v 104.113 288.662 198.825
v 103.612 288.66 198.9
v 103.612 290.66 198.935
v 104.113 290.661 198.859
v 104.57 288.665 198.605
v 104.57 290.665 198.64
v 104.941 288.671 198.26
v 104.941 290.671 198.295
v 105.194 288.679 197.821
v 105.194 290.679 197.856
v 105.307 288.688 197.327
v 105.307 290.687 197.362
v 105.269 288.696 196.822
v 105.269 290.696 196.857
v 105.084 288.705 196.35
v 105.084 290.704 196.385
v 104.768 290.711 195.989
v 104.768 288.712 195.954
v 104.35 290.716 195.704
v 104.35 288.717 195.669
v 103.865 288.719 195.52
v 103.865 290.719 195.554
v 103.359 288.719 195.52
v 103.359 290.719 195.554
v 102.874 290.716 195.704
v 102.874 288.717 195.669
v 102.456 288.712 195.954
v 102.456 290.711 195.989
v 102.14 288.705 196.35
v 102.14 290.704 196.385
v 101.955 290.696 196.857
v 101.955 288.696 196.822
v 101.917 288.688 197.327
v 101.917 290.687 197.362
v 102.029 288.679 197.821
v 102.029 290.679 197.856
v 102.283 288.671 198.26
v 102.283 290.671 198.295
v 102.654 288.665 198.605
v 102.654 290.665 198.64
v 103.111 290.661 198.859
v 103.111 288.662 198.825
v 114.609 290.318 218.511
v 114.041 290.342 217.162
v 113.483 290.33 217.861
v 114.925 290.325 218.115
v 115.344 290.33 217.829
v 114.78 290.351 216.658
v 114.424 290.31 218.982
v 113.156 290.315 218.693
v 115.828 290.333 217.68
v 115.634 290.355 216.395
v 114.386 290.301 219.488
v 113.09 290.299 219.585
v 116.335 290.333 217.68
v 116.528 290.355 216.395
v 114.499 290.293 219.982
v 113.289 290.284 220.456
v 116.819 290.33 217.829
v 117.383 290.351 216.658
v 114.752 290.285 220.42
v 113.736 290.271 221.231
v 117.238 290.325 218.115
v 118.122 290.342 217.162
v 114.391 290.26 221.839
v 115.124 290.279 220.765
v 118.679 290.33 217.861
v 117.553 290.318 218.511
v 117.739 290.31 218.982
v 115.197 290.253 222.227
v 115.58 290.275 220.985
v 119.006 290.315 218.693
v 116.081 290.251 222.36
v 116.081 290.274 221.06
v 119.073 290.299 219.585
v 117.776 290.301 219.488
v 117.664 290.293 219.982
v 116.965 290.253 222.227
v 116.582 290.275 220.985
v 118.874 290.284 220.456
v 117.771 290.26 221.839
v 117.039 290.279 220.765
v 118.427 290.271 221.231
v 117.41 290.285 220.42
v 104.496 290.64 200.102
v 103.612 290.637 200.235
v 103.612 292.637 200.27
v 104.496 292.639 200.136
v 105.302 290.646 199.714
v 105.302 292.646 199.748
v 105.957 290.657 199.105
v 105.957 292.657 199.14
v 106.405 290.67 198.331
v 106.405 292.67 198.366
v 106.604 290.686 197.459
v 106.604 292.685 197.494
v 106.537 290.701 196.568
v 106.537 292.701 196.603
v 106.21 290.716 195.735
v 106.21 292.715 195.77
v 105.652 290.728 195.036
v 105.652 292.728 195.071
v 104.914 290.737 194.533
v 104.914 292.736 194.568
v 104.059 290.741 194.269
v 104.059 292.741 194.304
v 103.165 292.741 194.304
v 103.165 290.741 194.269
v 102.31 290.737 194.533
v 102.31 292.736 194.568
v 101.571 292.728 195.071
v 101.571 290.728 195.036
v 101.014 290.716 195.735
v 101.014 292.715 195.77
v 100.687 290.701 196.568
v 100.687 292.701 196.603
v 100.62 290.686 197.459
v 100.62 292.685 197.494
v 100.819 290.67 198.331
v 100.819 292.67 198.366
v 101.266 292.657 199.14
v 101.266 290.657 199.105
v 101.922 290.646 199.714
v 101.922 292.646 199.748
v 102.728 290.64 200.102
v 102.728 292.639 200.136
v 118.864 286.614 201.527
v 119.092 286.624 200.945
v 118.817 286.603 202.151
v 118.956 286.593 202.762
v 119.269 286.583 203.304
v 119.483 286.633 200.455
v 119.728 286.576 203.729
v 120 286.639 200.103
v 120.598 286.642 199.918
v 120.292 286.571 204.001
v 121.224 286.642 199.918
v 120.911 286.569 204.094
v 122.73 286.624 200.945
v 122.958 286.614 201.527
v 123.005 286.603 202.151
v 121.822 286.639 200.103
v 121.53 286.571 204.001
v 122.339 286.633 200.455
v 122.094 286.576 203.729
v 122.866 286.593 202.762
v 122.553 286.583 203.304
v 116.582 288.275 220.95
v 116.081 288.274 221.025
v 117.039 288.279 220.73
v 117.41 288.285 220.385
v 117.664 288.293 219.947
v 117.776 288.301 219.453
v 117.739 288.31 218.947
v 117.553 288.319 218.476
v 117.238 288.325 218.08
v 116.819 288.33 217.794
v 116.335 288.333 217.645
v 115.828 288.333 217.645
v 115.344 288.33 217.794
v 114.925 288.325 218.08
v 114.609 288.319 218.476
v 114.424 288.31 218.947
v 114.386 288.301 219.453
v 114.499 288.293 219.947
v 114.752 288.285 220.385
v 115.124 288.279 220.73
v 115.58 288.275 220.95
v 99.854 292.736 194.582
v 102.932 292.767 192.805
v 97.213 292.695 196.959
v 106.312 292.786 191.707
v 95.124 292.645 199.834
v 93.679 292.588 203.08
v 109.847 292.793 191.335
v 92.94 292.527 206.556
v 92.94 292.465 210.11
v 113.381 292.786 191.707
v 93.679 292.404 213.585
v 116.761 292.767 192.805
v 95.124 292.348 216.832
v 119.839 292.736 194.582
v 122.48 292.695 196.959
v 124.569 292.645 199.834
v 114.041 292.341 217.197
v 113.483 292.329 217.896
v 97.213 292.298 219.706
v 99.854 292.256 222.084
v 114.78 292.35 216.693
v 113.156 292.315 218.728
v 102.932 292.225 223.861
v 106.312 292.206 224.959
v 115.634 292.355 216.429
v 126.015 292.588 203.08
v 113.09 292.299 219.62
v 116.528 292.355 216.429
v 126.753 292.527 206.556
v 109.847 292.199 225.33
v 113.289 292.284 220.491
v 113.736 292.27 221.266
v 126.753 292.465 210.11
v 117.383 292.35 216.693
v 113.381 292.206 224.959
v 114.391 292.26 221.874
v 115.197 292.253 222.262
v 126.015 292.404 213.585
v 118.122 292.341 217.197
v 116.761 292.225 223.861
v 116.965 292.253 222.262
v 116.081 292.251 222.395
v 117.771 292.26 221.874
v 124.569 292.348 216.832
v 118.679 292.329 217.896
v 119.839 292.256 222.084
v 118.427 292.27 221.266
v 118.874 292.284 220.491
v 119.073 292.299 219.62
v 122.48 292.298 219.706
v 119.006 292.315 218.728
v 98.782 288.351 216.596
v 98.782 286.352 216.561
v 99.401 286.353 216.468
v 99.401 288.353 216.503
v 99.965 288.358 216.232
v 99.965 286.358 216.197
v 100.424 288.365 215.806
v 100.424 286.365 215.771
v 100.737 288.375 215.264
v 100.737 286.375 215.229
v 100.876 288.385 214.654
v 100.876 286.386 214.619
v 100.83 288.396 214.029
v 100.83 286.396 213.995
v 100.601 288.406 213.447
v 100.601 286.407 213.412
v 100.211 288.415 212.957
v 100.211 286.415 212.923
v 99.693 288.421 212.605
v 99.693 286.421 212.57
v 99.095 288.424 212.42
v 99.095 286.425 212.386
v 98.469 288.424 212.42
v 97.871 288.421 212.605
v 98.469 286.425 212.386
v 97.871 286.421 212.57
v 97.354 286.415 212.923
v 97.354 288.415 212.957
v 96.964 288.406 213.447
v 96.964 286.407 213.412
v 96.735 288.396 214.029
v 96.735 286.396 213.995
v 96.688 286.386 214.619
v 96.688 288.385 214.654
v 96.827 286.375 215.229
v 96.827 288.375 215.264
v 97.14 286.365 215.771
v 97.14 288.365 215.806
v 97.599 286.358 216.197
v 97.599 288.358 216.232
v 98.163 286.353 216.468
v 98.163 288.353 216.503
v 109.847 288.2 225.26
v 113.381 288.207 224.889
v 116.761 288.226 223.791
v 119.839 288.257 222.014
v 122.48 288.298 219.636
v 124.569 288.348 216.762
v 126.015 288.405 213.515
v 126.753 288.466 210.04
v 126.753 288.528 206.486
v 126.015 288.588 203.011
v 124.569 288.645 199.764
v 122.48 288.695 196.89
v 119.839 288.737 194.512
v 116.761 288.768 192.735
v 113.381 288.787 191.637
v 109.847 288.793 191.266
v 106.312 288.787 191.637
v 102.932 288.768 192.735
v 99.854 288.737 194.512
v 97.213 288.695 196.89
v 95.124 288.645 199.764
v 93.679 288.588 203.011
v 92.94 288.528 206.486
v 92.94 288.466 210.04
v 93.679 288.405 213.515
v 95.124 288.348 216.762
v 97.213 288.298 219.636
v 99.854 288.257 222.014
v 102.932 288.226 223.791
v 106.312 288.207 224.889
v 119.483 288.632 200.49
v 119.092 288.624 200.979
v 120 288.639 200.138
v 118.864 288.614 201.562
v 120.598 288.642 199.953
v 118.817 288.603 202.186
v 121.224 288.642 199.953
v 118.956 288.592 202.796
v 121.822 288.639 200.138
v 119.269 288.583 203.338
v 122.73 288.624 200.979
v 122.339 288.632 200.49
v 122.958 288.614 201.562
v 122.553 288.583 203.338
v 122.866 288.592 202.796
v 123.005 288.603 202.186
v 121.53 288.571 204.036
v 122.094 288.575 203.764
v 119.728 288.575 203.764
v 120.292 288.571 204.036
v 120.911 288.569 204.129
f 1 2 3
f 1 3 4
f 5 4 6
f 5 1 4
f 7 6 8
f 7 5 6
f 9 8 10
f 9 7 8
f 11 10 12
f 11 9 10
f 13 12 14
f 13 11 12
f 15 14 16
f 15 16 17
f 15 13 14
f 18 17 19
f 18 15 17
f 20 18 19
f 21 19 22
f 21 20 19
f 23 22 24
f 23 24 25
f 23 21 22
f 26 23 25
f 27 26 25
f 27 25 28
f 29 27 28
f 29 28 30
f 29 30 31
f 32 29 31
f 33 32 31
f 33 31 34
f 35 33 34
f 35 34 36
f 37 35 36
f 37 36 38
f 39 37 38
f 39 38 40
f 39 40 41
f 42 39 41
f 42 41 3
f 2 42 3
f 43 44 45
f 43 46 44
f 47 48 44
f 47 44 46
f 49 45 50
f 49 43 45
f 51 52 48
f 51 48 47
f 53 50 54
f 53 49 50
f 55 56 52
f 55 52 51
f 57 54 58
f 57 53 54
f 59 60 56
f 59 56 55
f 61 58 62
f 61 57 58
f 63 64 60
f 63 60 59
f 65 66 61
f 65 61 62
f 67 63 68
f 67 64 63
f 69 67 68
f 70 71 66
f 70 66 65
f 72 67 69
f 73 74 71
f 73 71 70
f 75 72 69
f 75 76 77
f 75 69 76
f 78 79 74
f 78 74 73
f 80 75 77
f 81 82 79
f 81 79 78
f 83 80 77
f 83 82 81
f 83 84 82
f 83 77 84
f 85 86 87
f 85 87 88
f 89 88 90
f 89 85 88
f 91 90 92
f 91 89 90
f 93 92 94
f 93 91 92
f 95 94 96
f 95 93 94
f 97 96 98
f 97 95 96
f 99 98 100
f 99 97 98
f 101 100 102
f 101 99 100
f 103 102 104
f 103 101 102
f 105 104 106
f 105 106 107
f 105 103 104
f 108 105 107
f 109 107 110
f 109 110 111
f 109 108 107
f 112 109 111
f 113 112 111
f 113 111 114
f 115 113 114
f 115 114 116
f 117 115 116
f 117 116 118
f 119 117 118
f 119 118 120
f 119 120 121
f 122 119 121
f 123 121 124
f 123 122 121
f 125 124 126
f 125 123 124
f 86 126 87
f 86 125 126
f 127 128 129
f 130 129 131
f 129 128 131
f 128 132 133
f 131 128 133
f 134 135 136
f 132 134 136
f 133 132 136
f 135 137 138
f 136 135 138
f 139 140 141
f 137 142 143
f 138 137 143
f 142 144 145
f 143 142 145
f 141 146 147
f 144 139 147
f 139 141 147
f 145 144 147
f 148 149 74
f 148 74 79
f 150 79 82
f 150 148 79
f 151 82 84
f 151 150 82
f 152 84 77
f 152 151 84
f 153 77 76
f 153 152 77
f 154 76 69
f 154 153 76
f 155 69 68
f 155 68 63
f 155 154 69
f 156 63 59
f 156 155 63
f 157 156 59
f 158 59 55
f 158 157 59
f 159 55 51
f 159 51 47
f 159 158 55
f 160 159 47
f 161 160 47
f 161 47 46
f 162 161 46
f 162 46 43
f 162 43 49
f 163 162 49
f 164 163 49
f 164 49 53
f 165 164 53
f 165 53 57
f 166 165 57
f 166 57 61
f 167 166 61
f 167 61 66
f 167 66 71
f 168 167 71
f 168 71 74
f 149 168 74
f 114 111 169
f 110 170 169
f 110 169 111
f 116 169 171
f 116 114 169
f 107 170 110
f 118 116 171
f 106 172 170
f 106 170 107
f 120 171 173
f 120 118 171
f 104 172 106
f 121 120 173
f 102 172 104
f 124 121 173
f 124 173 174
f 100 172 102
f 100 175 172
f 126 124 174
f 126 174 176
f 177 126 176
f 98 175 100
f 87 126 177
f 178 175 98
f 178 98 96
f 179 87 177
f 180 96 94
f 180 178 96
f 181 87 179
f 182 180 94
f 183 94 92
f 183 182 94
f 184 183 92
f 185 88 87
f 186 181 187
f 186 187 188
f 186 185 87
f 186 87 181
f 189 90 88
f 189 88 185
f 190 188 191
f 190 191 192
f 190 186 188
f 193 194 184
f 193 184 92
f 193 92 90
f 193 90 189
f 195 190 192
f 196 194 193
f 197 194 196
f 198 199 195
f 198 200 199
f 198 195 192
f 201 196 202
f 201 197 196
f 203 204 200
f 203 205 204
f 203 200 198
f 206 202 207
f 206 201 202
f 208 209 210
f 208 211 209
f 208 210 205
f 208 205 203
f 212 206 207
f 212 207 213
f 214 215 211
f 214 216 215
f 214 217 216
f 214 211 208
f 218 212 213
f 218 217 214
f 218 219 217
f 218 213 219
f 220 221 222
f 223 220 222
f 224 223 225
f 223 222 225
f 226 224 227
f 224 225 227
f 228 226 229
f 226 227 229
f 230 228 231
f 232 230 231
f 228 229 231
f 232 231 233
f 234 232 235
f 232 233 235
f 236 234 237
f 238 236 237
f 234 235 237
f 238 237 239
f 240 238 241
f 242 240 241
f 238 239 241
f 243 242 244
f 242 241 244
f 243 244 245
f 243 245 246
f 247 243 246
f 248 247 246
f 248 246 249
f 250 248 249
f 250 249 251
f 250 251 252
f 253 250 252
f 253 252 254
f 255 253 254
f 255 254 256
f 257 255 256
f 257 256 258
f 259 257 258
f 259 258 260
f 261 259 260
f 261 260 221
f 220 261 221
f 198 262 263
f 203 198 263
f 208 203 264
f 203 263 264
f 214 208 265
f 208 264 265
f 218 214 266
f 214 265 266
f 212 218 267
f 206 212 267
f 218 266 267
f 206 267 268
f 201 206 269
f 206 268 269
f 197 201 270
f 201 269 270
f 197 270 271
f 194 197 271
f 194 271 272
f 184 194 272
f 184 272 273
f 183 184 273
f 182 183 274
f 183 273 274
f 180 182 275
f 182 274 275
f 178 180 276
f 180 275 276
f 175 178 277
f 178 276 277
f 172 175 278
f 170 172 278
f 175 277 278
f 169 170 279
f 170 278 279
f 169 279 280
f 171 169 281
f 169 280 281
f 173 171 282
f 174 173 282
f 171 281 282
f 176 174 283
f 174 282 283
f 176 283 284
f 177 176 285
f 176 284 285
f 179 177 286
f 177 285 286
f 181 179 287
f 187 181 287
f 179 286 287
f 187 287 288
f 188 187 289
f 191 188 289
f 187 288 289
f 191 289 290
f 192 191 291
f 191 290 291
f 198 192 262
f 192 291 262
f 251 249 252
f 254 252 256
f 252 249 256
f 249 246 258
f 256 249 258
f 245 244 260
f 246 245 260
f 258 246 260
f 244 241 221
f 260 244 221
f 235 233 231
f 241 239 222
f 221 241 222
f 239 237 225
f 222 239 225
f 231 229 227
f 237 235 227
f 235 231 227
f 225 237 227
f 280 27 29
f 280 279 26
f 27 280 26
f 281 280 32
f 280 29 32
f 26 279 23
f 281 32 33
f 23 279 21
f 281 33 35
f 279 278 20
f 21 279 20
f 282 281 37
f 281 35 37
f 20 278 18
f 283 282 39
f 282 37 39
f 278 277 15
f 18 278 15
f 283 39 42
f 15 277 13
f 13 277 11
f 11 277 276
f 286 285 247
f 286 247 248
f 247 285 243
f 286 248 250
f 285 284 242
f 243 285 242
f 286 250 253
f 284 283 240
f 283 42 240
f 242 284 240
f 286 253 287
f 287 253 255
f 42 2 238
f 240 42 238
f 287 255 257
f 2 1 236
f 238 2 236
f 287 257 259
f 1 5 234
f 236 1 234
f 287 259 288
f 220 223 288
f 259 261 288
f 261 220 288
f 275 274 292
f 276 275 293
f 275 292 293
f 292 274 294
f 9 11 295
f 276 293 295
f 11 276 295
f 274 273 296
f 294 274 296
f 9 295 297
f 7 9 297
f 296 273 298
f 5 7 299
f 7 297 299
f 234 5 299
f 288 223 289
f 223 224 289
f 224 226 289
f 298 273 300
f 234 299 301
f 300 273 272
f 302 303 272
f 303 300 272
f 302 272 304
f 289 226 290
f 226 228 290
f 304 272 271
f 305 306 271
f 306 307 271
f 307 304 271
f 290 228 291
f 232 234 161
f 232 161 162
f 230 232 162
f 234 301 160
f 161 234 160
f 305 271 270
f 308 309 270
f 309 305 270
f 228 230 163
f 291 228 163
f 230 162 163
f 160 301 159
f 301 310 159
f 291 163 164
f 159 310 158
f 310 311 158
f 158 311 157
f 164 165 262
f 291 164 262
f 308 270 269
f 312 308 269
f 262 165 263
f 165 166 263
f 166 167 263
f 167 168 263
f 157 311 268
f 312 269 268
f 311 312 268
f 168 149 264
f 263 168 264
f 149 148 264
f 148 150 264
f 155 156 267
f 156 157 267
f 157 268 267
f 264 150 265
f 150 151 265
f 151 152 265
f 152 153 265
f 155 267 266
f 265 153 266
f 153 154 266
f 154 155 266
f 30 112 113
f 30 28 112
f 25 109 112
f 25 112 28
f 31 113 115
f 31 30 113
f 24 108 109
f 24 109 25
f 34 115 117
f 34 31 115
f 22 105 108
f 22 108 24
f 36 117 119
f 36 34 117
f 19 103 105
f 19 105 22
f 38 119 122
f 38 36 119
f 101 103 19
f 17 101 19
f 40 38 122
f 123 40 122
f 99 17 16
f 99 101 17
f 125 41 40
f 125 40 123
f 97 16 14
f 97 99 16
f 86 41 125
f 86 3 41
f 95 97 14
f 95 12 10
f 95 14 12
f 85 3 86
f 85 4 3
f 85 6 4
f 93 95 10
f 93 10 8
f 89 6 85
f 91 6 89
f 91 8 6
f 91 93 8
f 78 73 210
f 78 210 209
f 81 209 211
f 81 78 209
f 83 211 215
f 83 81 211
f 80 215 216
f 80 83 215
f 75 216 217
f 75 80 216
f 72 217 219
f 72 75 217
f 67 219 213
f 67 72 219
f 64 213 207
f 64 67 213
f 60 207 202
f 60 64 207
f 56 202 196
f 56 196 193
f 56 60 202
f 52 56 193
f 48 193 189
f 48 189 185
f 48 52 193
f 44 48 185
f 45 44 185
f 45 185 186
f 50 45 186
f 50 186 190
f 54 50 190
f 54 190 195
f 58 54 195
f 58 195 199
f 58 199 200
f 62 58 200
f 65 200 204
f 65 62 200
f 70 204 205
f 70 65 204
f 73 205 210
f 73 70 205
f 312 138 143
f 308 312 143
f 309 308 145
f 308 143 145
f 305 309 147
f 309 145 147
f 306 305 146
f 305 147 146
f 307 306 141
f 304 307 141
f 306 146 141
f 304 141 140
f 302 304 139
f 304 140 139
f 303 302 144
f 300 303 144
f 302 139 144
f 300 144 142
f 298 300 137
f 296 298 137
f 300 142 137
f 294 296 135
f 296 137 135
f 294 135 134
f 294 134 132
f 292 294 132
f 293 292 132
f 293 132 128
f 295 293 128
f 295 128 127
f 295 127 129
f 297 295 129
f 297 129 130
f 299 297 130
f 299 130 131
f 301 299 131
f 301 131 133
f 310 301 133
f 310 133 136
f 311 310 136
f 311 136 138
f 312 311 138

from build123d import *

# Parameters (mm, degrees)
SKETCH1_R           = 17
SKETCH1_R_2         = 2.1
SKETCH1_R_3         = 1.7
BOSS_EXTRUDE1_DEPTH = 4
BOSS_EXTRUDE2_START = -6
SKETCH2_R           = 2.1
BOSS_EXTRUDE2_DEPTH = 6
CUT_EXTRUDE1_START  = -2
SKETCH3_R           = 3
SKETCH3_R_2         = 1.7
CUT_EXTRUDE1_DEPTH  = 2


with BuildPart() as part:
    # Sketch1 → Boss-Extrude1 (new body)
    with BuildSketch(Plane(origin=(0, 292.043042306, 5.097630265), x_dir=(1, 0, 0), z_dir=(0, 0.9998476951563913, 0.017452406437283286))):
        with Locations(Location((109.84658574, -203.196308074, 0), (0, 0, 270))):
            Circle(SKETCH1_R)
        with Locations(Location((120.910918653, -196.961684011, 0), (0, 0, 270))):
            Circle(SKETCH1_R_2, mode=Mode.SUBTRACT)
        with Locations(Location((98.782252828, -209.430932137, 0), (0, 0, 270))):
            Circle(SKETCH1_R_2, mode=Mode.SUBTRACT)
        with Locations(Location((116.081209803, -214.260640986, 0), (0, 0, 270))):
            Circle(SKETCH1_R_3, mode=Mode.SUBTRACT)
        with Locations(Location((103.611961678, -192.131975161, 0), (0, 0, 270))):
            Circle(SKETCH1_R_3, mode=Mode.SUBTRACT)
    extrude(amount=BOSS_EXTRUDE1_DEPTH)

    # Sketch2 → Boss-Extrude2 (add)
    with BuildSketch(Plane(origin=(0, 296.042433086, 5.167439891), x_dir=(1, 0, 0), z_dir=(0, 0.9998476951563913, 0.01745240643728325)).offset(BOSS_EXTRUDE2_START)):
        with Locations(Location((98.782252828, -209.430932137, 0), (0, 0, 270))):
            Circle(SKETCH2_R)
        with Locations(Location((120.910918653, -196.961684011, 0), (0, 0, 270))):
            Circle(SKETCH2_R)
    extrude(amount=BOSS_EXTRUDE2_DEPTH)

    # Sketch3 → Cut-Extrude1 (cut)
    # profile 1 of 2: a face of its own
    with BuildSketch(Plane(origin=(0, 296.042433086, 5.167439891), x_dir=(1, 0, 0), z_dir=(0, 0.9998476951563913, 0.01745240643728325)).offset(CUT_EXTRUDE1_START)):
        with Locations(Location((103.611961678, -192.131975161, 0), (0, 0, 270))):
            Circle(SKETCH3_R)
        with Locations(Location((103.611961678, -192.131975161, 0), (0, 0, 270))):
            Circle(SKETCH3_R_2, mode=Mode.SUBTRACT)
    # profile 2 of 2: a face of its own
    with BuildSketch(Plane(origin=(0, 296.042433086, 5.167439891), x_dir=(1, 0, 0), z_dir=(0, 0.9998476951563913, 0.01745240643728325)).offset(CUT_EXTRUDE1_START)):
        with Locations(Location((116.081209803, -214.260640986, 0), (0, 0, 270))):
            Circle(SKETCH3_R)
        with Locations(Location((116.081209803, -214.260640986, 0), (0, 0, 270))):
            Circle(SKETCH3_R_2, mode=Mode.SUBTRACT)
    extrude(amount=CUT_EXTRUDE1_DEPTH, mode=Mode.SUBTRACT)


solid = part.part
